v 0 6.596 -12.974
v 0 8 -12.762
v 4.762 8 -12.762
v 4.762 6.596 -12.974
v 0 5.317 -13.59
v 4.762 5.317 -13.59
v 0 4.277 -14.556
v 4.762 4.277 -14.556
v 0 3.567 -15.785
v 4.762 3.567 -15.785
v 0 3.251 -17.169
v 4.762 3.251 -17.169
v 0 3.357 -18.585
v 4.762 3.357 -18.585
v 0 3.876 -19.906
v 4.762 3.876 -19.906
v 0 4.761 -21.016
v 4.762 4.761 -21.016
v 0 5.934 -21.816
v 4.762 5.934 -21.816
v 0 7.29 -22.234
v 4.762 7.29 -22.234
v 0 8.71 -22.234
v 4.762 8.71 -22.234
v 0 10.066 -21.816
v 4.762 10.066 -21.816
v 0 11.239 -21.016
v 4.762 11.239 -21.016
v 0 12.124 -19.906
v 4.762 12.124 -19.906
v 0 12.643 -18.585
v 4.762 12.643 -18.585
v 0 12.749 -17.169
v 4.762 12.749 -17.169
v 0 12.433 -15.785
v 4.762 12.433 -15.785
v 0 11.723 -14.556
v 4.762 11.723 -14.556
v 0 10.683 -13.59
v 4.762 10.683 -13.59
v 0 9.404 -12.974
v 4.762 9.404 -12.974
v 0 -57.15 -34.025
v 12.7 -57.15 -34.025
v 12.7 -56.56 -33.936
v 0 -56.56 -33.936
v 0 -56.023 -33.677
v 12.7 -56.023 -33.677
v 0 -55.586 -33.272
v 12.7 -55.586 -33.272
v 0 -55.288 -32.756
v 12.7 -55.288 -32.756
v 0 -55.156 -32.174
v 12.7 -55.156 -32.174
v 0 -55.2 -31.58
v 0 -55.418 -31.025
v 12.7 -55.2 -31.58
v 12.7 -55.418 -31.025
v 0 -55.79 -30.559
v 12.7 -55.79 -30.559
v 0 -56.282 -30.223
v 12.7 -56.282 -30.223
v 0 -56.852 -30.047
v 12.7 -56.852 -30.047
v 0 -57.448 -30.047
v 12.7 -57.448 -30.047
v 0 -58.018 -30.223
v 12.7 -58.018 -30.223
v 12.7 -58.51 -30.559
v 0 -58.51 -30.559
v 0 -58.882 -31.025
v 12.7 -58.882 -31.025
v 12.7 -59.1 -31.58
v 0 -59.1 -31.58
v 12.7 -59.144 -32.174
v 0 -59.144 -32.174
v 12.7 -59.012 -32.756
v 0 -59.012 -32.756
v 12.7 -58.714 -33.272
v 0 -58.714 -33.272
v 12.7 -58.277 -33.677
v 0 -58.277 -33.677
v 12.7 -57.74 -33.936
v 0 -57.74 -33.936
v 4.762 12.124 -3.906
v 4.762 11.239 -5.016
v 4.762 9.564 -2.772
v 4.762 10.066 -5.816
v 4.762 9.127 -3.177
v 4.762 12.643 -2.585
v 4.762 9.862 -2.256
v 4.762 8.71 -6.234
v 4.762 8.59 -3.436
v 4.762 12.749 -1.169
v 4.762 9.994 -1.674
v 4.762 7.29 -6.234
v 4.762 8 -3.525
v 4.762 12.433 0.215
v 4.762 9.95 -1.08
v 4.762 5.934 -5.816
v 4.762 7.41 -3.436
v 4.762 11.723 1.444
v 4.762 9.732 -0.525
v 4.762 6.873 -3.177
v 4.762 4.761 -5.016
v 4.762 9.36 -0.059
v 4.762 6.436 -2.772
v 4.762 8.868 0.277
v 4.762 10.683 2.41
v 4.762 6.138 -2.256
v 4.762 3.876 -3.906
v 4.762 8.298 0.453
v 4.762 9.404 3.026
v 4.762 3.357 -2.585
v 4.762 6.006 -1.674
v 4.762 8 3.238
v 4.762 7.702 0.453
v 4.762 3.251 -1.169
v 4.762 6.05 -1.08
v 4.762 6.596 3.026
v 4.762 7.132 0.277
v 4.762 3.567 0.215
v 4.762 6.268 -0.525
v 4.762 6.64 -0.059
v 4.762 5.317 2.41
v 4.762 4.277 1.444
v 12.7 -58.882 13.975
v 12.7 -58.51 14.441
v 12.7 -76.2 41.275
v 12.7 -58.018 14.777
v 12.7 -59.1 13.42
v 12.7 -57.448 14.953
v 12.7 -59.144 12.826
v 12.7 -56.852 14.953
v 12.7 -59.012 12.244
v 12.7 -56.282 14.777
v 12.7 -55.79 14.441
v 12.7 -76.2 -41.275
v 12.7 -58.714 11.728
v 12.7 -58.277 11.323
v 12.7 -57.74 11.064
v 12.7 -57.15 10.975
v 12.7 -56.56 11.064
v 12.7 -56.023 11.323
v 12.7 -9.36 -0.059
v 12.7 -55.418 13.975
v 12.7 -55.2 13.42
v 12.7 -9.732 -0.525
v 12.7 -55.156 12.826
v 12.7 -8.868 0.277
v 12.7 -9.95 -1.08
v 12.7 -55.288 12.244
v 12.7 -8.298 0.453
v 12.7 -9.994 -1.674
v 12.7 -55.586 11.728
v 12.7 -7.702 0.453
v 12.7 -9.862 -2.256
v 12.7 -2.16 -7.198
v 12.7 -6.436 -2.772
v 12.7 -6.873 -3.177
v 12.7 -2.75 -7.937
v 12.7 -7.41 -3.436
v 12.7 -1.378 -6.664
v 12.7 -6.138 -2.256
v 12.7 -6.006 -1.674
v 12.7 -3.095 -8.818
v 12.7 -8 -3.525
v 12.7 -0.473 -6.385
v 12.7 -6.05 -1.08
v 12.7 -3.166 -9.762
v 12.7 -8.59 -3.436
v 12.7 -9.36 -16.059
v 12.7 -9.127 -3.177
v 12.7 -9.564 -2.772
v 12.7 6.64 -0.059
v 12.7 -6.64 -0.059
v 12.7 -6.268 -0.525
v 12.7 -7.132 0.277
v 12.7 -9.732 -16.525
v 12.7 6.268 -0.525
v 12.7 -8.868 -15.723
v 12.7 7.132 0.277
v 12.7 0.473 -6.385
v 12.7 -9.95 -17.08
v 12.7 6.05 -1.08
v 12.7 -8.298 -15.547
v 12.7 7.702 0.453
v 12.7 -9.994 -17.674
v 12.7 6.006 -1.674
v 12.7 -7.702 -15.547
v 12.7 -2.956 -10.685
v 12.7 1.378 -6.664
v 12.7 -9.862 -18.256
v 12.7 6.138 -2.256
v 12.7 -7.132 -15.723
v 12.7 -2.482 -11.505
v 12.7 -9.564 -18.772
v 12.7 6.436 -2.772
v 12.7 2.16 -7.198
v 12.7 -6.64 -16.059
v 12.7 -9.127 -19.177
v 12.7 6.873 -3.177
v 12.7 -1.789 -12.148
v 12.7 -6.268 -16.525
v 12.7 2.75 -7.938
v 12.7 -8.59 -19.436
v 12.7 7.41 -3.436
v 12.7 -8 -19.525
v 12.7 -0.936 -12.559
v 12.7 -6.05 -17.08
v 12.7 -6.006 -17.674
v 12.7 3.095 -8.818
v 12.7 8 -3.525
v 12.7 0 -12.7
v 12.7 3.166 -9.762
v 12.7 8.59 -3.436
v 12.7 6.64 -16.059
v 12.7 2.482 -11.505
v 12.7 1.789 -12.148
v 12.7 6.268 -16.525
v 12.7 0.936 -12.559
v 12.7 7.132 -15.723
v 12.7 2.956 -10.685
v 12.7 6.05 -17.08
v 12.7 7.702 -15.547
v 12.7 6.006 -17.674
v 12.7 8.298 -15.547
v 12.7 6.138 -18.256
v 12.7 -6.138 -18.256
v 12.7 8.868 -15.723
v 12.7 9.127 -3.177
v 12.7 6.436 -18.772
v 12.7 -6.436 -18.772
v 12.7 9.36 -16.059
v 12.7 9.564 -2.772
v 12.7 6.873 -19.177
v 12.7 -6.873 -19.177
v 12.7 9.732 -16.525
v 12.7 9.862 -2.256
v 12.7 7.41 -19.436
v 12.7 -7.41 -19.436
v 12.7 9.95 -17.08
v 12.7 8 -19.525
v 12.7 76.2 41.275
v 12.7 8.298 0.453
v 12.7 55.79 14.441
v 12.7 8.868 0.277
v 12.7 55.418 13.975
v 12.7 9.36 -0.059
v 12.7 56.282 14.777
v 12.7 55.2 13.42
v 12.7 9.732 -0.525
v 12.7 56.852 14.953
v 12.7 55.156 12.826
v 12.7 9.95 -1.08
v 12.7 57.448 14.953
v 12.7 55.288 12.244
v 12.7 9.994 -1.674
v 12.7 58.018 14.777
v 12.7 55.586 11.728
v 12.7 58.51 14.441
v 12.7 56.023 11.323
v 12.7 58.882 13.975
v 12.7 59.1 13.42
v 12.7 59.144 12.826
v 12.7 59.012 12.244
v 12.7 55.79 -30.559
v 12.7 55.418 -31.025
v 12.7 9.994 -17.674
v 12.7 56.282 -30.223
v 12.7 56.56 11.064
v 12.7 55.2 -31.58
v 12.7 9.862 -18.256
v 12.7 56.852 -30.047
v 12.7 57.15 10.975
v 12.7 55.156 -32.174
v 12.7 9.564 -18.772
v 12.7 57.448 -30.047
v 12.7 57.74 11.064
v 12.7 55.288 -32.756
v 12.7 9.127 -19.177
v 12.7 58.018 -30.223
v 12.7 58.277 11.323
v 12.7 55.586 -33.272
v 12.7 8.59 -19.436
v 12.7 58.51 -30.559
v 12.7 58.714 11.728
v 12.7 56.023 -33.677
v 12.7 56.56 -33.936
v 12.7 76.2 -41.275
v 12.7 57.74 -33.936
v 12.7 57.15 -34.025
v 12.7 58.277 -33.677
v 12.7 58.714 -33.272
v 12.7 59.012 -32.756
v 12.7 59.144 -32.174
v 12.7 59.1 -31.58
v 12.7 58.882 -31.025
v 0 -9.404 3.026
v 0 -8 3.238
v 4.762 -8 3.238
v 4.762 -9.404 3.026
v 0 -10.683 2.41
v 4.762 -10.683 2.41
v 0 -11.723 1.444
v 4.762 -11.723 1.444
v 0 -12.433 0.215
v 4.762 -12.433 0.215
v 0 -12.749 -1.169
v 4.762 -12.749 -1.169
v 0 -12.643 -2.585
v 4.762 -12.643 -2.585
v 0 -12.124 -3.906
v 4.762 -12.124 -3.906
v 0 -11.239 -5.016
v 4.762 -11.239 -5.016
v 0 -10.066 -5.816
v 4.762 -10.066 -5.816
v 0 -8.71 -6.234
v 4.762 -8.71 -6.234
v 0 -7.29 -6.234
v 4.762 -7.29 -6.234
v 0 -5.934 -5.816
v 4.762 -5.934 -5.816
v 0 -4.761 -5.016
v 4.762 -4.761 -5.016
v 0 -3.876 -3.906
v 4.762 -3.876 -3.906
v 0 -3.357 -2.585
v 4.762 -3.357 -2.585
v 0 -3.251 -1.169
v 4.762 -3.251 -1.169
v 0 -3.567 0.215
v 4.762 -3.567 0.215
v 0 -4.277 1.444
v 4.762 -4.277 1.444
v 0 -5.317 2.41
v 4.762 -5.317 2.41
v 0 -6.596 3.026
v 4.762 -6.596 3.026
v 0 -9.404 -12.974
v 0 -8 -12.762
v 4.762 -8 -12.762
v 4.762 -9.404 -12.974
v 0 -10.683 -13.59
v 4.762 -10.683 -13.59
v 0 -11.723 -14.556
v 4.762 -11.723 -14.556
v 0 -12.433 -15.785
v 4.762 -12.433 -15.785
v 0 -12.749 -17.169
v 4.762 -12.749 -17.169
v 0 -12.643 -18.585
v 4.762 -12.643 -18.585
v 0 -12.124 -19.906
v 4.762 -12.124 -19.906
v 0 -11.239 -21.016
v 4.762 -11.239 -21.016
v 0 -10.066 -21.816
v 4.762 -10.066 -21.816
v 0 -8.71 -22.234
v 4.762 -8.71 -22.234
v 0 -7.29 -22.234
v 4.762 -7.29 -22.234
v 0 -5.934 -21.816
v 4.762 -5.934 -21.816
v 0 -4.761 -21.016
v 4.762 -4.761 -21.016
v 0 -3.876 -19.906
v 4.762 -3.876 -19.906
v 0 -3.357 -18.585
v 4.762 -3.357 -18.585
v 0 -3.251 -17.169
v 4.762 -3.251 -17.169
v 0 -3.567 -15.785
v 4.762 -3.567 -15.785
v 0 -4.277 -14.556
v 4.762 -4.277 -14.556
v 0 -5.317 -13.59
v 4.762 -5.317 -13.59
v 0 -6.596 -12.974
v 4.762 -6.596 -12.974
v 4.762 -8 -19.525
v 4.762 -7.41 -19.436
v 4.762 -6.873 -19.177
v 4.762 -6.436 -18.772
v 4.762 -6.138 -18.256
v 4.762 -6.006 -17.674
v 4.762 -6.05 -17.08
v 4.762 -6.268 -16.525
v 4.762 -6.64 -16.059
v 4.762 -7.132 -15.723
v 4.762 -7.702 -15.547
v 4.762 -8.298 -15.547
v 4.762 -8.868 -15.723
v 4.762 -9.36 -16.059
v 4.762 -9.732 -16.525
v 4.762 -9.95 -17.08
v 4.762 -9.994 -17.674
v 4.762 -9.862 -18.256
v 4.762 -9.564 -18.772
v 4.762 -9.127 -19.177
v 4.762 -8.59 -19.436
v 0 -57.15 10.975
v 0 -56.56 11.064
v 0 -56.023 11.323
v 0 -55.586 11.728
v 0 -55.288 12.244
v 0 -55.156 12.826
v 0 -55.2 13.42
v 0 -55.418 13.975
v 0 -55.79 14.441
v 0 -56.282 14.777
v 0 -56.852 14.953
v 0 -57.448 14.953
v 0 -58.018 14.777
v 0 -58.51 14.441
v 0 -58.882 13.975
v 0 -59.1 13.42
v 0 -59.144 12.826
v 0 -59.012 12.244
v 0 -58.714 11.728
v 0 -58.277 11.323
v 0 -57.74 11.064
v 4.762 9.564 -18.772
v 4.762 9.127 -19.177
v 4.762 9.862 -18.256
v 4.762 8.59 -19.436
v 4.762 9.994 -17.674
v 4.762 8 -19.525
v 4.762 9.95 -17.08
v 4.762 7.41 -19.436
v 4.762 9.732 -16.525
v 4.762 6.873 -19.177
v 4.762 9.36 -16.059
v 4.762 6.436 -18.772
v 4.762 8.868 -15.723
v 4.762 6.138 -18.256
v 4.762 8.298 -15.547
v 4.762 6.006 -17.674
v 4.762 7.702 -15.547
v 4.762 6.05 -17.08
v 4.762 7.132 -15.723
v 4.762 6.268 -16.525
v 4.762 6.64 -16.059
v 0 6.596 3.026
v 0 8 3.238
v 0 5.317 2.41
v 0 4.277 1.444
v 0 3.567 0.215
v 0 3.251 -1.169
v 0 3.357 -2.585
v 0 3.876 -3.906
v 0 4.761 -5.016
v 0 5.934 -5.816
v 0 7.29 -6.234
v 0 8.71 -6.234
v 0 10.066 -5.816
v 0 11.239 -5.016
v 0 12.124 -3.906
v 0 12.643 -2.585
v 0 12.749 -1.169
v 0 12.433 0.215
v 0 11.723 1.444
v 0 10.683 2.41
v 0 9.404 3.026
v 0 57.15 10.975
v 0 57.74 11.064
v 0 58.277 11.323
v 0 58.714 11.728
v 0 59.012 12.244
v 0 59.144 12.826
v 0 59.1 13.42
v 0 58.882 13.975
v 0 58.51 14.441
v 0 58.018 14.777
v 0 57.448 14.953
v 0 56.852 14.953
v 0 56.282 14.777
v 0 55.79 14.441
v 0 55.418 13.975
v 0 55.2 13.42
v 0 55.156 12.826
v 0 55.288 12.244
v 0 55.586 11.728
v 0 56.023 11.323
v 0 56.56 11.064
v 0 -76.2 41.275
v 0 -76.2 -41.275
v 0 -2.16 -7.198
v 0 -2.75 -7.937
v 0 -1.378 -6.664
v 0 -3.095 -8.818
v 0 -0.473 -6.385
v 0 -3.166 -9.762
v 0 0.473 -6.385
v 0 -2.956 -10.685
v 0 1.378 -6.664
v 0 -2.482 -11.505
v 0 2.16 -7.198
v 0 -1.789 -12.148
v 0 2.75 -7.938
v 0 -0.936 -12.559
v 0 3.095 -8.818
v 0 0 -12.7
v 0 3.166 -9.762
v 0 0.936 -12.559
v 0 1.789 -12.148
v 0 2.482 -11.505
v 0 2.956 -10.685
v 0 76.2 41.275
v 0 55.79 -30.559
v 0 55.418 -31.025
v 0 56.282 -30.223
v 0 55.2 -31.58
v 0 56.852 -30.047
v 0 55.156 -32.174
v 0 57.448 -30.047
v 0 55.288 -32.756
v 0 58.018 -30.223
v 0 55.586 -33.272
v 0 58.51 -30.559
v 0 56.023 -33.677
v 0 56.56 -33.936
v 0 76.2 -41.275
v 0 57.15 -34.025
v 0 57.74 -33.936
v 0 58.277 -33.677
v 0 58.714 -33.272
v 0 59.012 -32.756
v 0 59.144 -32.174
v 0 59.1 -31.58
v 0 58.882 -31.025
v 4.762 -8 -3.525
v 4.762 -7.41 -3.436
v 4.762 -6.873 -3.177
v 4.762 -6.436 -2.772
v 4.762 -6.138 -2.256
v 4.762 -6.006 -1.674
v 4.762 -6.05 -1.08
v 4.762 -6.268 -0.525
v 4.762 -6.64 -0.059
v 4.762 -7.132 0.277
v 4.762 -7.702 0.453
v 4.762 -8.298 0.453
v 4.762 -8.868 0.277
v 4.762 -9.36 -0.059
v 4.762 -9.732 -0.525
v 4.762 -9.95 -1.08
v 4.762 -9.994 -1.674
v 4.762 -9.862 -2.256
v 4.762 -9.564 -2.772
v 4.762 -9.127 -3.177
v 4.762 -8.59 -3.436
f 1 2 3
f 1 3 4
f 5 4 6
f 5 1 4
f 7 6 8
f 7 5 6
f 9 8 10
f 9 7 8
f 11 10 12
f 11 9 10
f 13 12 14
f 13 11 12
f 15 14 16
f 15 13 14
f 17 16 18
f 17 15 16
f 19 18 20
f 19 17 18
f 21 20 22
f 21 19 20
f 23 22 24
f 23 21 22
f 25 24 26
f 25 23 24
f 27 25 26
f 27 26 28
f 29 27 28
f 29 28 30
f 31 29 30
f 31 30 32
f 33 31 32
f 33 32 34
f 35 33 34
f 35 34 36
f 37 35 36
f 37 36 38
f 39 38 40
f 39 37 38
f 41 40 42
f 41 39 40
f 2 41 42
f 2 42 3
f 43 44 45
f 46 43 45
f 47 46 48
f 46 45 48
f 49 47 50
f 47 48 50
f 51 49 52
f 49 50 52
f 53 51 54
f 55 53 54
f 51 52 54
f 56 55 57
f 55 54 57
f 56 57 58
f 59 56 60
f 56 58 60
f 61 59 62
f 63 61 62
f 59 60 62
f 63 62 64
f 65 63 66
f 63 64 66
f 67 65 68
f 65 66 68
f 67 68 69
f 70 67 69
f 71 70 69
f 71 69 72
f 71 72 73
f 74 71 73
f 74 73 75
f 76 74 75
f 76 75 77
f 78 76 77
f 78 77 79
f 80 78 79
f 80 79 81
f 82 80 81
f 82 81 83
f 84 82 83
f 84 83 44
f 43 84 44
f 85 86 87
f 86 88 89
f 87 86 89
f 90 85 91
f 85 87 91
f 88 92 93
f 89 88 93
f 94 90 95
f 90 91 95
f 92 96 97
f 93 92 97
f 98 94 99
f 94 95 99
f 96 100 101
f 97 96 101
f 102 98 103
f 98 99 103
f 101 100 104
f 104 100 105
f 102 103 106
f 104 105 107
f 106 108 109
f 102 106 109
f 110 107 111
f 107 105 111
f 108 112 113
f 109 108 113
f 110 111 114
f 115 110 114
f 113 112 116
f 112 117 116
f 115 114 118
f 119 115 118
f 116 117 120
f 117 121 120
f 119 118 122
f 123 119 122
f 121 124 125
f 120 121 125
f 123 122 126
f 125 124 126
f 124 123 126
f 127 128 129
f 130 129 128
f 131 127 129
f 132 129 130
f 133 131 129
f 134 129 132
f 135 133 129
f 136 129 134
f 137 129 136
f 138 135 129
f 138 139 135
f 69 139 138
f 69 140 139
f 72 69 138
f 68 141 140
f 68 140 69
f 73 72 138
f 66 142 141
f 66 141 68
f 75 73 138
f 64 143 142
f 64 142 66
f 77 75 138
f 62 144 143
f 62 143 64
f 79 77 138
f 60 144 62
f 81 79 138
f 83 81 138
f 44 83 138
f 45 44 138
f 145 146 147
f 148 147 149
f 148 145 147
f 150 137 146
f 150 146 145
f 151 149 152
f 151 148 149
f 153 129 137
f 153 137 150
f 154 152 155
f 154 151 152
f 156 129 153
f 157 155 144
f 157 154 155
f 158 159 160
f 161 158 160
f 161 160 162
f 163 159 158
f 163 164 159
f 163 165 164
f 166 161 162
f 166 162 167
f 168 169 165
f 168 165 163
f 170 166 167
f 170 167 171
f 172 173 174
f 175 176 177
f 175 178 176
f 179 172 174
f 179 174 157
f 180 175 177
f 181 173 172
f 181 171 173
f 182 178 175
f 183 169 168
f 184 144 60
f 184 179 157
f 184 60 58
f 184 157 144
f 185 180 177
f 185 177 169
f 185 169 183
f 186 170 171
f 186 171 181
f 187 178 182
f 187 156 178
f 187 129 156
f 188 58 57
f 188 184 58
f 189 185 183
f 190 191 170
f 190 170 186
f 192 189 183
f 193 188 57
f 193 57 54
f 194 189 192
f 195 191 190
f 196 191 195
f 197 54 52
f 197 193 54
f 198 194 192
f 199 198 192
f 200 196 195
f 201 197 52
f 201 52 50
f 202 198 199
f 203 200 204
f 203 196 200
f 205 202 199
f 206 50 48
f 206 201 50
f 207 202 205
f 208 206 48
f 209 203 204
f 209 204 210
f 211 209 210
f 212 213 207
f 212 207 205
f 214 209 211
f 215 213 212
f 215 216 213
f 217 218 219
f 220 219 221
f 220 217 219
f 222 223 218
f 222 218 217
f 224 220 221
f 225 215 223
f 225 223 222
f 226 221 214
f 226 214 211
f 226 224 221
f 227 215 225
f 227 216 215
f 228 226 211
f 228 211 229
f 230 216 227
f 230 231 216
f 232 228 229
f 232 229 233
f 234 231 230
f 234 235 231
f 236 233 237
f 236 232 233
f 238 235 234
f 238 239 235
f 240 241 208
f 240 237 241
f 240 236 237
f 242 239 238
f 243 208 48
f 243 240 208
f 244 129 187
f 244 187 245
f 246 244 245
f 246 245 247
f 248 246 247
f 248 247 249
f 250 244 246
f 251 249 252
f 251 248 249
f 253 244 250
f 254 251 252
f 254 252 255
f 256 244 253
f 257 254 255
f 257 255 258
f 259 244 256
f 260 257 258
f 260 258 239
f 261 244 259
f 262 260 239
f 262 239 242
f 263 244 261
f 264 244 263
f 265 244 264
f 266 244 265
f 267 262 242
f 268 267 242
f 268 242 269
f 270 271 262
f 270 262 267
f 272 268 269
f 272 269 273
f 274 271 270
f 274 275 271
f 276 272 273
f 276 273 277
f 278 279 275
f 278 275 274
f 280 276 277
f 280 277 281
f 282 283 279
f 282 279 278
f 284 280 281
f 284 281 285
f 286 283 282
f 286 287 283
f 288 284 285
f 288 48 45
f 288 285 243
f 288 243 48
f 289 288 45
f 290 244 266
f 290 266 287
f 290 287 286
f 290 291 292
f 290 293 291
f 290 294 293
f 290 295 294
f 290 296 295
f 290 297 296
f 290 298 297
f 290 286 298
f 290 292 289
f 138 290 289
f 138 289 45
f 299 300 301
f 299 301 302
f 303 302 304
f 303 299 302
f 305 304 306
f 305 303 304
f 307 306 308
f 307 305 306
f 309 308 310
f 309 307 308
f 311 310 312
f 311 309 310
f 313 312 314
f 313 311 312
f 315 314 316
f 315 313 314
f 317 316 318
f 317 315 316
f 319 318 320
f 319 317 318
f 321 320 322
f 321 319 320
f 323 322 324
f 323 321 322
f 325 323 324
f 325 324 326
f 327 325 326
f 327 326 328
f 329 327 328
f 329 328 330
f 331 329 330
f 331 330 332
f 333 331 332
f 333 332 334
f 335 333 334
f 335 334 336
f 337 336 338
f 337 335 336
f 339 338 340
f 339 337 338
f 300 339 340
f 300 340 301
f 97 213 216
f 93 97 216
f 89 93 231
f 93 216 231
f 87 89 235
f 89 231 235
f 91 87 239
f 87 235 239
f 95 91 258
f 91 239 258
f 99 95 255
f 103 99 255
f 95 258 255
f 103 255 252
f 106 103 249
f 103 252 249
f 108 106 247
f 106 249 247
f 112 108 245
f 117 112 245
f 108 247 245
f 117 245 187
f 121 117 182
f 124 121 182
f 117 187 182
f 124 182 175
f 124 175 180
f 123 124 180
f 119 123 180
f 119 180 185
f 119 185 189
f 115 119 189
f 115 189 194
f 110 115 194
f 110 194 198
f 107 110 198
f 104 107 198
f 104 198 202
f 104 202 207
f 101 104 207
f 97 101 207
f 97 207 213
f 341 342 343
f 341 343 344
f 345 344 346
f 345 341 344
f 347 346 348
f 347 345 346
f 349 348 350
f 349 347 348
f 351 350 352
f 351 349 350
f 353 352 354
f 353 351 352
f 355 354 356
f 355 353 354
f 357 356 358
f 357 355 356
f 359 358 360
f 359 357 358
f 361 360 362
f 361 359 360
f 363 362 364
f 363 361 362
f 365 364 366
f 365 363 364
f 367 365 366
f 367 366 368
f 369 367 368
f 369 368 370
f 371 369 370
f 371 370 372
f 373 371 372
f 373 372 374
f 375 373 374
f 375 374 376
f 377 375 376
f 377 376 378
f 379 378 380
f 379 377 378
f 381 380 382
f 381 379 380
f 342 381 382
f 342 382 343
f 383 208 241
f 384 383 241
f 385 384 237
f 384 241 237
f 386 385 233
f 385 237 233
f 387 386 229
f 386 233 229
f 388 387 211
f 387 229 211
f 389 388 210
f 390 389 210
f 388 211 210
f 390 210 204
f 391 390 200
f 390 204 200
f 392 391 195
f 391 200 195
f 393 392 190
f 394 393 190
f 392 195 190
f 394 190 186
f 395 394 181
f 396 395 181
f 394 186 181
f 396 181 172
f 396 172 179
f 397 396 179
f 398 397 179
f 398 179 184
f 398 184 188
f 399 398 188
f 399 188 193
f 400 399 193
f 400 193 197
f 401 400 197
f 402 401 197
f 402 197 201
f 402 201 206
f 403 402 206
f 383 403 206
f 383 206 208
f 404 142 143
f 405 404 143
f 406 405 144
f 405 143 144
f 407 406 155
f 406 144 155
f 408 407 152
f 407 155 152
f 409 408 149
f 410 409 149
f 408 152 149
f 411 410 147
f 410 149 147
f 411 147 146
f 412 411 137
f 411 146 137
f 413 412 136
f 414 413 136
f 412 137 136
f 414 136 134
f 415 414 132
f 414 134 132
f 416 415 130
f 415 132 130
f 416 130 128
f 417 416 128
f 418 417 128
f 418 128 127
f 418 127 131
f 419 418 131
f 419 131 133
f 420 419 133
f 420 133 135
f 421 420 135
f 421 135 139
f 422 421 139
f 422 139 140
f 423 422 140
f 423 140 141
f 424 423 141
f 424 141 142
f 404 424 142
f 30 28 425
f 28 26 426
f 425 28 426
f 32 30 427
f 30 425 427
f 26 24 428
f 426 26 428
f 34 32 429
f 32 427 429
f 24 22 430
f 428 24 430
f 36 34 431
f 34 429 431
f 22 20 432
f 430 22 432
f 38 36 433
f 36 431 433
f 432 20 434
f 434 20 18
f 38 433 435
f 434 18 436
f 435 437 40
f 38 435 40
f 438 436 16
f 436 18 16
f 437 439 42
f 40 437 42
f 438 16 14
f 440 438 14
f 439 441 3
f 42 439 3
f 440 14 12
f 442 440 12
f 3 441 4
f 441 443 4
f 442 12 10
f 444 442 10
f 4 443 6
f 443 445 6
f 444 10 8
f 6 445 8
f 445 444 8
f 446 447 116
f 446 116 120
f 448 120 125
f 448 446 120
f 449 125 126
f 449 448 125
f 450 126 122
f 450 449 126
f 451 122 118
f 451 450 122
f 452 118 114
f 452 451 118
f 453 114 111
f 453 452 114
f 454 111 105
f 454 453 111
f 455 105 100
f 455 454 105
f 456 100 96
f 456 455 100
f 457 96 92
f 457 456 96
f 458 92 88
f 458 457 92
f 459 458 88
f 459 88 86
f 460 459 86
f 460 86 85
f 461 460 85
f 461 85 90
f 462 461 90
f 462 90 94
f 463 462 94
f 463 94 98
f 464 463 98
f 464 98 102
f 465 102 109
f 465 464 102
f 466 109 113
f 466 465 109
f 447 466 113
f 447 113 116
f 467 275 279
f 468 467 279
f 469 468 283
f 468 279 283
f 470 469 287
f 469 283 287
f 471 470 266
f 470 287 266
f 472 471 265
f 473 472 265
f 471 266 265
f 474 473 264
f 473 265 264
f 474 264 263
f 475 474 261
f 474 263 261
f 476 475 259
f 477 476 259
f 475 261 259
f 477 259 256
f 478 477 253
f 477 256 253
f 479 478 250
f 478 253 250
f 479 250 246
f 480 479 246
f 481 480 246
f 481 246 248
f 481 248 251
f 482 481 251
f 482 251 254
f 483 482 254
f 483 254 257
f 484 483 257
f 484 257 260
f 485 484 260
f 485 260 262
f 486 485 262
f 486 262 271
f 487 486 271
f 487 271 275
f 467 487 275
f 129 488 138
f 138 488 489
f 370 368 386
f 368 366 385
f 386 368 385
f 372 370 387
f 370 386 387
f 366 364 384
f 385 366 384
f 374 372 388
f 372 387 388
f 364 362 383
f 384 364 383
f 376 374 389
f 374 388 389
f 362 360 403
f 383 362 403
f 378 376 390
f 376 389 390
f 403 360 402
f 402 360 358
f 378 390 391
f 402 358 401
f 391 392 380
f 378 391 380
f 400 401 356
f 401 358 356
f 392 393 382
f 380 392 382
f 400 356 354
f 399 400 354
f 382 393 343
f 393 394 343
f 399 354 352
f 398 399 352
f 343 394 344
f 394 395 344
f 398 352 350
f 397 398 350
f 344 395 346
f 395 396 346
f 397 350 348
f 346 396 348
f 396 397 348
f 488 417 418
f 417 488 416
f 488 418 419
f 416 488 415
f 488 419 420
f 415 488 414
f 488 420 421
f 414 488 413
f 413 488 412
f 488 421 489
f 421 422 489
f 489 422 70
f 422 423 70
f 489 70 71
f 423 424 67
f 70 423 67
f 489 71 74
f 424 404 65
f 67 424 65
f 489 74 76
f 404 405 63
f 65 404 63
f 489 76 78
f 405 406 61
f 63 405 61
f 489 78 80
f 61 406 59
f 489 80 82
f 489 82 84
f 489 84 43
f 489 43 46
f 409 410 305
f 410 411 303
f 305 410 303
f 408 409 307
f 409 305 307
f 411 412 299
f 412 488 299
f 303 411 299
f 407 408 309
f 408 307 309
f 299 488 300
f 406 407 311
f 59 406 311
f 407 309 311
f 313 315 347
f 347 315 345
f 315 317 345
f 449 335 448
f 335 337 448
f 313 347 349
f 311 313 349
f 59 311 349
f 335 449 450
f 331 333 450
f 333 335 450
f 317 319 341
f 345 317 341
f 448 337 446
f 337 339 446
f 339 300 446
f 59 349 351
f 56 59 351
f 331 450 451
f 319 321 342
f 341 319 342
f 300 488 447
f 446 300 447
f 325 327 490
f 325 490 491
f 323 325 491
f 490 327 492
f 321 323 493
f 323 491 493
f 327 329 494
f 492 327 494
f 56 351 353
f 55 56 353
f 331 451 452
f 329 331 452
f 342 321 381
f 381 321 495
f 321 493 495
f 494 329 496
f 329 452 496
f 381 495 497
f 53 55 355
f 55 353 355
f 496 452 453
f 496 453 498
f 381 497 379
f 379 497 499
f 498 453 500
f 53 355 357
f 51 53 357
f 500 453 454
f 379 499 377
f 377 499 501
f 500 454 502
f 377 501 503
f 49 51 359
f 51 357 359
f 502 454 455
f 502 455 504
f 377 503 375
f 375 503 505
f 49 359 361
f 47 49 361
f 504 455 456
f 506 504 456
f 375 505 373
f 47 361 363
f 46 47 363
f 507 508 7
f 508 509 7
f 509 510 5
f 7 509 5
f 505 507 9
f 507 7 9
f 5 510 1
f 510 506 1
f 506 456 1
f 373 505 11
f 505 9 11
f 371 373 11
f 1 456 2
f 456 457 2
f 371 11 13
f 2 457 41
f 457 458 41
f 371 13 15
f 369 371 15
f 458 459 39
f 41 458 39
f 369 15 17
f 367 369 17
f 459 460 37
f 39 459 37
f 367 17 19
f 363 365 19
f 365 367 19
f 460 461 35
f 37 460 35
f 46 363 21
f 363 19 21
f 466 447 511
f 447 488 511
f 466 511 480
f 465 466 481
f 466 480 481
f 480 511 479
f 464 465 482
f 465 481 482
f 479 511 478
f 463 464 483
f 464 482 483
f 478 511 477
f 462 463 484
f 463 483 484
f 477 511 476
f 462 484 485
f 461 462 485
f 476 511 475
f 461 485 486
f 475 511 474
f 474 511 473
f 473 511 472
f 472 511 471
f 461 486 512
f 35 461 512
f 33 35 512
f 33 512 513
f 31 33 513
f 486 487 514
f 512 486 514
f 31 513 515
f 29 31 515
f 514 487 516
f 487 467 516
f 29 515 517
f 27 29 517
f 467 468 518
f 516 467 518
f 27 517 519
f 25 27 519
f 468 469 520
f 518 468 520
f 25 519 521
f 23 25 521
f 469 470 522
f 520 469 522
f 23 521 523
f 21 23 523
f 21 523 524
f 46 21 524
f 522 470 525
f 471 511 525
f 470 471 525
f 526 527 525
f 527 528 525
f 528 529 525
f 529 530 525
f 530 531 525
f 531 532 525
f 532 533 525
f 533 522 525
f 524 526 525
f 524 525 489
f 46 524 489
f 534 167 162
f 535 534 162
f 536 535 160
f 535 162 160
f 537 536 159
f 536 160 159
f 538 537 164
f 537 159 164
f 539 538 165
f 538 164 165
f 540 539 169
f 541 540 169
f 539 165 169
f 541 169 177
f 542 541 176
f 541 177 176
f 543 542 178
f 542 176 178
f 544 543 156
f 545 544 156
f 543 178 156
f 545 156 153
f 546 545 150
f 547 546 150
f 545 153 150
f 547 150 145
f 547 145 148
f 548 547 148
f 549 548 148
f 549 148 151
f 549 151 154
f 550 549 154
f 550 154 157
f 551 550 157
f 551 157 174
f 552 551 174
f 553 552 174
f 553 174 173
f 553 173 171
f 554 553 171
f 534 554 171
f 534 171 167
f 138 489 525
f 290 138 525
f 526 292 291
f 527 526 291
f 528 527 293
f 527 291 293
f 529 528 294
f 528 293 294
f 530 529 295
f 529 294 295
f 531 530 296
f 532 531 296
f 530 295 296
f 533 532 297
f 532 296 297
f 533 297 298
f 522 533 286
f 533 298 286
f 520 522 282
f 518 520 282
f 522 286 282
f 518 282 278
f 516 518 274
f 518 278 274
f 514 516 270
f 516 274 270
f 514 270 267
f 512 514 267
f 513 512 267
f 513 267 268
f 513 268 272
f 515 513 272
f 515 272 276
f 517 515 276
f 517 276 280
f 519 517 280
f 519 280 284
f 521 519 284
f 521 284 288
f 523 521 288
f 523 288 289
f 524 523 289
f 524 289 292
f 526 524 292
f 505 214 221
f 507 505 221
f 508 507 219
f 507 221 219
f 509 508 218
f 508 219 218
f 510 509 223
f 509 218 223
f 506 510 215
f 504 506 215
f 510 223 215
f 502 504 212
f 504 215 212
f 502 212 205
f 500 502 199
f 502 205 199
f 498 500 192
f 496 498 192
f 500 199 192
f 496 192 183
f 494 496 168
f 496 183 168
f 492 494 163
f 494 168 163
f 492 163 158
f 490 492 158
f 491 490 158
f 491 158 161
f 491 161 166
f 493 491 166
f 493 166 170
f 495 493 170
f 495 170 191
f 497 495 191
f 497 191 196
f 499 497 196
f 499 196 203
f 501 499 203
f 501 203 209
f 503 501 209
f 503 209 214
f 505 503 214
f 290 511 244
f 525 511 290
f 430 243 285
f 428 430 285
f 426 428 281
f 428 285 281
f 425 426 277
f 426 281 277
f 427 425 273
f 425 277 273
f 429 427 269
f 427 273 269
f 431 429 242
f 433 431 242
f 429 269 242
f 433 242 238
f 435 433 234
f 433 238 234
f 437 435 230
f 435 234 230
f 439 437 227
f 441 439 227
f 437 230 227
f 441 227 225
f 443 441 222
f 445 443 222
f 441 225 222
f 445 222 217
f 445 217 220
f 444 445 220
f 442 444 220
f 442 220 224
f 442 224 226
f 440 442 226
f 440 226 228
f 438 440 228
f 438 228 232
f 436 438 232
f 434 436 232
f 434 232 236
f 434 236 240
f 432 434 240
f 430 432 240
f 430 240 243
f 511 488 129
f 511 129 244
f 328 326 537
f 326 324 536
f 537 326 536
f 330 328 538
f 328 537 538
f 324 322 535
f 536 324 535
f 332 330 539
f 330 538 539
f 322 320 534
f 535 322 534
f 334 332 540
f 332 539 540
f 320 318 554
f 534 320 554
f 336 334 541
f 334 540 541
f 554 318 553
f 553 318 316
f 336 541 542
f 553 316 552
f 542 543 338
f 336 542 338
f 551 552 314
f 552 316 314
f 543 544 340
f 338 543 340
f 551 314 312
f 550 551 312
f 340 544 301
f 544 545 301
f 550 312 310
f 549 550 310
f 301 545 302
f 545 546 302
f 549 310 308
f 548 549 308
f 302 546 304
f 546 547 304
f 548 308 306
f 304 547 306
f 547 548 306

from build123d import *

# Parameters (mm, degrees)
ESQUISSE1_W             = 82.55
ESQUISSE1_H             = 152.4
BOSS_EXTRU_1_DEPTH      = 12.7
ESQUISSE2_R             = 2
ENL_V_MAT_EXTRU_1_DEPTH = 88.586275323
ESQUISSE3_R             = 3.175
ESQUISSE3_R_2           = 2
ENL_V_MAT_EXTRU_2_DEPTH = 88.586275323
ESQUISSE4_R             = 4.7625
ENL_V_MAT_EXTRU_3_DEPTH = 4.7625


with BuildPart() as part:
    # Esquisse1 → Boss.-Extru.1 (new body)
    with BuildSketch(Plane(origin=(0, 0, 0), x_dir=(0, 0, -1), z_dir=(1, 0, 0))):
        Rectangle(ESQUISSE1_W, ESQUISSE1_H)
    extrude(amount=BOSS_EXTRU_1_DEPTH)

    # Esquisse2 → Enlèv. mat.-Extru.1 (cut, through all)
    with BuildSketch(Plane(origin=(12.7, 0, 0), x_dir=(0, 0, -1), z_dir=(1, 0, 0))):
        with Locations((-12.974999958, 57.15)):
            Circle(ESQUISSE2_R)
        with Locations((32.025000042, 57.15)):
            Circle(ESQUISSE2_R)
        with Locations((-12.974999958, -57.15)):
            Circle(ESQUISSE2_R)
        with Locations((32.025000042, -57.15)):
            Circle(ESQUISSE2_R)
    extrude(amount=-ENL_V_MAT_EXTRU_1_DEPTH, mode=Mode.SUBTRACT)

    # Esquisse3 → Enlèv. mat.-Extru.2 (cut, through all)
    with BuildSketch(Plane(origin=(12.7, 0, 0), x_dir=(0, 0, -1), z_dir=(1, 0, 0))):
        with Locations((9.525, 0)):
            Circle(ESQUISSE3_R)
        with Locations((17.525, 8)):
            Circle(ESQUISSE3_R_2)
        with Locations((1.525, 8)):
            Circle(ESQUISSE3_R_2)
        with Locations((1.525, -8)):
            Circle(ESQUISSE3_R_2)
        with Locations((17.525, -8)):
            Circle(ESQUISSE3_R_2)
    extrude(amount=-ENL_V_MAT_EXTRU_2_DEPTH, mode=Mode.SUBTRACT)

    # Esquisse4 → Enlèv. mat.-Extru.3 (cut)
    with BuildSketch(Plane(origin=(0, 0, 0), x_dir=(0, 0, -1), z_dir=(1, 0, 0))):
        with Locations(Location((17.525, 8, 0), (0, 0, 180))):
            Circle(ESQUISSE4_R)
        with Locations(Location((1.525, 8, 0), (0, 0, 180))):
            Circle(ESQUISSE4_R)
        with Locations(Location((1.525, -8, 0), (0, 0, 180))):
            Circle(ESQUISSE4_R)
        with Locations(Location((17.525, -8, 0), (0, 0, 180))):
            Circle(ESQUISSE4_R)
    extrude(amount=ENL_V_MAT_EXTRU_3_DEPTH, mode=Mode.SUBTRACT)


solid = part.part
